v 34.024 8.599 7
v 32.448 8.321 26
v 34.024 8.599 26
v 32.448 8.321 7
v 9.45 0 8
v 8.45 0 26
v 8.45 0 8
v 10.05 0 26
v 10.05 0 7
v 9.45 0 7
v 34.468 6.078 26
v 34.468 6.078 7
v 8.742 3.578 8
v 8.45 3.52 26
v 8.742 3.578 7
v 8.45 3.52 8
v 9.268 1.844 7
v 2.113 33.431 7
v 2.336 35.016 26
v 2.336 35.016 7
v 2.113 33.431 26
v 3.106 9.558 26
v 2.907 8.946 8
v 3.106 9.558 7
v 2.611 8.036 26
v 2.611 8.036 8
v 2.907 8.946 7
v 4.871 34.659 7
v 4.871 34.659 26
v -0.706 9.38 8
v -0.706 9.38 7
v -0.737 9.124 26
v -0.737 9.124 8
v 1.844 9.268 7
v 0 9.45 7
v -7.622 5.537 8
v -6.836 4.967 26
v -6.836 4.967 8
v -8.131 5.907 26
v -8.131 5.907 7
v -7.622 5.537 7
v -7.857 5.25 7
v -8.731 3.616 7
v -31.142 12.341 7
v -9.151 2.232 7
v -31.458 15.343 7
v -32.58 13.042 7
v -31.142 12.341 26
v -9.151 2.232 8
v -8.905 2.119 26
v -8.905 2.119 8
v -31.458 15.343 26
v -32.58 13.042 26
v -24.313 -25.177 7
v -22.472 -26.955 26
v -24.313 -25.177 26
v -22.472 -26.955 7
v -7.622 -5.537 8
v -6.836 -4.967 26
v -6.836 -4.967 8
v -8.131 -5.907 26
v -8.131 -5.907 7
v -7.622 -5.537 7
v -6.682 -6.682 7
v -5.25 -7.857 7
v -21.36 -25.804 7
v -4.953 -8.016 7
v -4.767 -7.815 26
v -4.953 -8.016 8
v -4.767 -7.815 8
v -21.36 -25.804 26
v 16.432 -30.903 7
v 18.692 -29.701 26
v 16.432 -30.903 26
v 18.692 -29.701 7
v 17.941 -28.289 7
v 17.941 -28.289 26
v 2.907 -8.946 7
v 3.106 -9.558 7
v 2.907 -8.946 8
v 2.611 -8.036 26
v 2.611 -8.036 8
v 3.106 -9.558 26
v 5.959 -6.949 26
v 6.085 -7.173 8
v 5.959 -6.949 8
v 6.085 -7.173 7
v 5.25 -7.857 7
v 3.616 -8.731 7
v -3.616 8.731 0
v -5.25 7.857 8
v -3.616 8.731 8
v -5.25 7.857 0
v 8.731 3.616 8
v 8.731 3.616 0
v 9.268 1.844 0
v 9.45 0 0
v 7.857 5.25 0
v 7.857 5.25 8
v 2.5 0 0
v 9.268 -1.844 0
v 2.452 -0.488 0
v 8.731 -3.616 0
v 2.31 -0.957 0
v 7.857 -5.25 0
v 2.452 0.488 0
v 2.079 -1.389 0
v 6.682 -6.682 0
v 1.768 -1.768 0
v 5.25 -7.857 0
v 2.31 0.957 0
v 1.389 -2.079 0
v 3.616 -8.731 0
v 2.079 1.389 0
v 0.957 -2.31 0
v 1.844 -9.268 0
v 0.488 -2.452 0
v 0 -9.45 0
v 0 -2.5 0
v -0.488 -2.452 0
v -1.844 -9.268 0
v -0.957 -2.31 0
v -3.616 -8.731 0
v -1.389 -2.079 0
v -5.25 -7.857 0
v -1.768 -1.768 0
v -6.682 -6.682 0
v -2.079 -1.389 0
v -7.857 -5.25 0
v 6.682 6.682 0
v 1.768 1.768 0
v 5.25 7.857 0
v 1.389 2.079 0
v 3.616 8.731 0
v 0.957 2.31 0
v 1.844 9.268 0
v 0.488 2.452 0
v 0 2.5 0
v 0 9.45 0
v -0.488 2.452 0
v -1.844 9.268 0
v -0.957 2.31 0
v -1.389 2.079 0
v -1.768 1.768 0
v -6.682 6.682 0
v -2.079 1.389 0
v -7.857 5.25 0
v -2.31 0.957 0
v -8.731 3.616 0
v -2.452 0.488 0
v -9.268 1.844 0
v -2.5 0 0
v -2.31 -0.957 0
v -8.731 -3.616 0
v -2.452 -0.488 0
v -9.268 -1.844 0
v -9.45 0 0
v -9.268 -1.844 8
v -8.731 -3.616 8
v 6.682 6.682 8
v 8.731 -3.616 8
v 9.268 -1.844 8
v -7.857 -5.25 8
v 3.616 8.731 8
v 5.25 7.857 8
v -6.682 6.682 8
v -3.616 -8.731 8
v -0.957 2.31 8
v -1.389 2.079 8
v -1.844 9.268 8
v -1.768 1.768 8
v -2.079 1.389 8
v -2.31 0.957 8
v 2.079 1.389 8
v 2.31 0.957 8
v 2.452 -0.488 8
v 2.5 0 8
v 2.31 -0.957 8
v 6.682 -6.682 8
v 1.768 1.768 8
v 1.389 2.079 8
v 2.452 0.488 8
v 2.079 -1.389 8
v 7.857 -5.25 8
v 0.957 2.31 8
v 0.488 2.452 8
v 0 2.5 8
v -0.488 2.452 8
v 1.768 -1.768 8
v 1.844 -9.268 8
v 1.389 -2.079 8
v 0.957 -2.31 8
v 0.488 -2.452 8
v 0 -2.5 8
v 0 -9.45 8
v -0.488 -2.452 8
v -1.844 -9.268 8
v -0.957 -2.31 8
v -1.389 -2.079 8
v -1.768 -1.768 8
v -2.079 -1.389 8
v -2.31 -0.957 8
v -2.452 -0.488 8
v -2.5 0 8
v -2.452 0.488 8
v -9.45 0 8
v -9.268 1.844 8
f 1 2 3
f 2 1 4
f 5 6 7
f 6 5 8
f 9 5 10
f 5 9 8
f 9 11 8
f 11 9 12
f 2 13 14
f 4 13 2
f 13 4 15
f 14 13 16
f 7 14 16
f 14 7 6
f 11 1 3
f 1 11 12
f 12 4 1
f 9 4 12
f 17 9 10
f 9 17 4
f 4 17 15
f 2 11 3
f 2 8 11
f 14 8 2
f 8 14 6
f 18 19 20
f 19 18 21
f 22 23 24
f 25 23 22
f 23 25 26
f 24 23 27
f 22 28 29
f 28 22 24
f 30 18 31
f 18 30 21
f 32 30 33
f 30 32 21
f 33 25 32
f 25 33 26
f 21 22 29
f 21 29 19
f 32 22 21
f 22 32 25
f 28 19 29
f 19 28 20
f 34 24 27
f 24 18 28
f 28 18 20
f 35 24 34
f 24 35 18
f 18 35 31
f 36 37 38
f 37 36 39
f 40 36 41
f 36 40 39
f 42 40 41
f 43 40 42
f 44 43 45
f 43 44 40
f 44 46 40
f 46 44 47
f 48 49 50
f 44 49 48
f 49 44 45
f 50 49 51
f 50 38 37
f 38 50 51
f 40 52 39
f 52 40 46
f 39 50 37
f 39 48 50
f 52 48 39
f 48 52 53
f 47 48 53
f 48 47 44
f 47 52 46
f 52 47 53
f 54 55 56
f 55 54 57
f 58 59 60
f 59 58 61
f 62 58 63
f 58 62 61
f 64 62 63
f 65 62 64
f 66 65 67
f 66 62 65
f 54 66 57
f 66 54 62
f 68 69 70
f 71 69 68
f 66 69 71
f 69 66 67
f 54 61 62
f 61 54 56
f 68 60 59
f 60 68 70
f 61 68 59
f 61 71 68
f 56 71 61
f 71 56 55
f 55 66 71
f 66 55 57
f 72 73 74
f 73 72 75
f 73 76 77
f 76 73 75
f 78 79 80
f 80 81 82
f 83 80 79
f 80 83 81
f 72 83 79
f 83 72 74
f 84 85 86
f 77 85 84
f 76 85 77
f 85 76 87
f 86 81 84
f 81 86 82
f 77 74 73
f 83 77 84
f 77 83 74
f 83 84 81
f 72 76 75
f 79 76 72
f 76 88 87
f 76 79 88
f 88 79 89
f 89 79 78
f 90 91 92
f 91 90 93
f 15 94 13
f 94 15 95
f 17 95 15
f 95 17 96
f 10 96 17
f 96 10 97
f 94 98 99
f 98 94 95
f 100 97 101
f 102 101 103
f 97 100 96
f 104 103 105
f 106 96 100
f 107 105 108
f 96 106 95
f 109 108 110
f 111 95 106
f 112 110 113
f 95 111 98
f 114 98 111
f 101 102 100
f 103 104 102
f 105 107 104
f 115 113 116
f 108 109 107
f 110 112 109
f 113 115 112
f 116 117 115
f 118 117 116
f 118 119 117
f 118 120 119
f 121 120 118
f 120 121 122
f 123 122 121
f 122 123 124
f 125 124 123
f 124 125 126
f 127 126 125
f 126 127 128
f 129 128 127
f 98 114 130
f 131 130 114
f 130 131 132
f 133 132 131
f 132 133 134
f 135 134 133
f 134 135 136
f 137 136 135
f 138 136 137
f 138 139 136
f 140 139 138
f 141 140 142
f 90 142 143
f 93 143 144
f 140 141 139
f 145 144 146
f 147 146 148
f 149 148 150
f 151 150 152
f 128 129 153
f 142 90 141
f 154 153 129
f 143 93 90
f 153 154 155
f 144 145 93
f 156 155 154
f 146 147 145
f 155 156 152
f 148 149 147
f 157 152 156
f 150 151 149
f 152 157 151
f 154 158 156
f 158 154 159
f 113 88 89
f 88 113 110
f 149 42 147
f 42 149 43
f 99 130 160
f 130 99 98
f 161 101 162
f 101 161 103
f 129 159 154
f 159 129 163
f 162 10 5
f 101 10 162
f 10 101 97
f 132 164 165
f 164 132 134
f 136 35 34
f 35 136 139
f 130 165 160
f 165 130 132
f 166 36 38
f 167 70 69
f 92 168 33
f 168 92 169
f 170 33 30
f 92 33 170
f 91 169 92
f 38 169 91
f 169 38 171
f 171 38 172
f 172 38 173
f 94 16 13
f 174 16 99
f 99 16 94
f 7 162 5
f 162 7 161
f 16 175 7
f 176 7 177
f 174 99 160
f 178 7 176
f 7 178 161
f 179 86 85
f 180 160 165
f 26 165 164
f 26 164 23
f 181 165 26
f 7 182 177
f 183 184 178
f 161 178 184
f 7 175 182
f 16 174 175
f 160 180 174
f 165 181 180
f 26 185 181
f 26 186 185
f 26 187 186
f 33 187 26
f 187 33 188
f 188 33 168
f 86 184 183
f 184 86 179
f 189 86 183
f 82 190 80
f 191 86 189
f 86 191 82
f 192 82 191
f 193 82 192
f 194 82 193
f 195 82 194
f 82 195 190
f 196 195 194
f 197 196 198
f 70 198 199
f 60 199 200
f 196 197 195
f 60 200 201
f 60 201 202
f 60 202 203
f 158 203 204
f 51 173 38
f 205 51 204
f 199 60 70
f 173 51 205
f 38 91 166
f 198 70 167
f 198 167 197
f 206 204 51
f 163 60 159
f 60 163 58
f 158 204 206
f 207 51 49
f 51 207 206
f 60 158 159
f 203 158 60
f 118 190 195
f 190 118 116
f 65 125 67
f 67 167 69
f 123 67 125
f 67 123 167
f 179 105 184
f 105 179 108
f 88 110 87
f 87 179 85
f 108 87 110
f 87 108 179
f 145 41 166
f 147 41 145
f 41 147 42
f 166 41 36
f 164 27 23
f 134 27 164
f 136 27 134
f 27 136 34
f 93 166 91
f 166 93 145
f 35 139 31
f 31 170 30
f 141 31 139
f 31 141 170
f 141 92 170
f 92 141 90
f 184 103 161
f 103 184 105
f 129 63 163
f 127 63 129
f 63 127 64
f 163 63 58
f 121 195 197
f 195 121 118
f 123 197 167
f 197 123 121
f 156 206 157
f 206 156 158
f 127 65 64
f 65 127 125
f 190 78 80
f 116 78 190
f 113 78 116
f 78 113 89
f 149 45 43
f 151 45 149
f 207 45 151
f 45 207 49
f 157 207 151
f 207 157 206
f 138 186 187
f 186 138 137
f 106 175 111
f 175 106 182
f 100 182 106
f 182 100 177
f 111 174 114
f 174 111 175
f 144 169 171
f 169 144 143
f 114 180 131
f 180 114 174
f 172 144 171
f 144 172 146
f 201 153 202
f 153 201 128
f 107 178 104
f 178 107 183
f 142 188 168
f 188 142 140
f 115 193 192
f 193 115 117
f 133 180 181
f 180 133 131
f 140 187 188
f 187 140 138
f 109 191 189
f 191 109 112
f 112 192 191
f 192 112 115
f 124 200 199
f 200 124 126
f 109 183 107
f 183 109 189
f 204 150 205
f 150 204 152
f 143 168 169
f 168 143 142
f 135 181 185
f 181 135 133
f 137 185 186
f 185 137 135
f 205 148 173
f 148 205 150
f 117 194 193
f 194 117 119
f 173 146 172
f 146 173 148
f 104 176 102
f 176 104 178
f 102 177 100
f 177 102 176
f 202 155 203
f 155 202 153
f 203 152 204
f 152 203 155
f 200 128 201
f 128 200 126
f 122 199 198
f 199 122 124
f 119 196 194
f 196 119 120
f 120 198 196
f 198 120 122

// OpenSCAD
$fn = 32;
// ----------------------------------------------------------------------
// Impeller: 70 mm, 5 blades, 26 mm tall
// ----------------------------------------------------------------------

// --- parameters (mm) ---
hub_d = 18.9;             // hub diameter
hub_h = 8;                // hub height
imp_d = 70;               // outer diameter over the blades
blades = 5;               // number of blades
blade_t = 1.6;            // blade thickness
blade_h = 18;             // blade height
blade_in_r = 8.45;        // blade root radius
blade_out_r = 33.4;       // blade tip radius
sweep = 10;               // blade sweep, degrees
bore_d = 5;               // shaft bore

module hub() {
  cylinder(h = hub_h, d = hub_d);
}

module blade() {
  /* blade swept between two boxes: hull of the root and the tip section */
  hull() {
    translate([blade_in_r, 0, hub_h - 1])
      cube([blade_t, blade_t * 2.2, blade_h + 1], center = false);
    rotate([0, 0, sweep])
      translate([blade_out_r, 0, hub_h - 1])
        cube([blade_t, blade_t * 1.6, blade_h + 1], center = false);
  }
}

module blades() {
  for (i = [0 : blades - 1])
    rotate([0, 0, i * 360 / blades]) blade();
}

difference() {
  union() {
    hub();
    blades();
  }
  translate([0, 0, -1]) cylinder(h = hub_h + blade_h + 0 + 3, d = bore_d);
}
